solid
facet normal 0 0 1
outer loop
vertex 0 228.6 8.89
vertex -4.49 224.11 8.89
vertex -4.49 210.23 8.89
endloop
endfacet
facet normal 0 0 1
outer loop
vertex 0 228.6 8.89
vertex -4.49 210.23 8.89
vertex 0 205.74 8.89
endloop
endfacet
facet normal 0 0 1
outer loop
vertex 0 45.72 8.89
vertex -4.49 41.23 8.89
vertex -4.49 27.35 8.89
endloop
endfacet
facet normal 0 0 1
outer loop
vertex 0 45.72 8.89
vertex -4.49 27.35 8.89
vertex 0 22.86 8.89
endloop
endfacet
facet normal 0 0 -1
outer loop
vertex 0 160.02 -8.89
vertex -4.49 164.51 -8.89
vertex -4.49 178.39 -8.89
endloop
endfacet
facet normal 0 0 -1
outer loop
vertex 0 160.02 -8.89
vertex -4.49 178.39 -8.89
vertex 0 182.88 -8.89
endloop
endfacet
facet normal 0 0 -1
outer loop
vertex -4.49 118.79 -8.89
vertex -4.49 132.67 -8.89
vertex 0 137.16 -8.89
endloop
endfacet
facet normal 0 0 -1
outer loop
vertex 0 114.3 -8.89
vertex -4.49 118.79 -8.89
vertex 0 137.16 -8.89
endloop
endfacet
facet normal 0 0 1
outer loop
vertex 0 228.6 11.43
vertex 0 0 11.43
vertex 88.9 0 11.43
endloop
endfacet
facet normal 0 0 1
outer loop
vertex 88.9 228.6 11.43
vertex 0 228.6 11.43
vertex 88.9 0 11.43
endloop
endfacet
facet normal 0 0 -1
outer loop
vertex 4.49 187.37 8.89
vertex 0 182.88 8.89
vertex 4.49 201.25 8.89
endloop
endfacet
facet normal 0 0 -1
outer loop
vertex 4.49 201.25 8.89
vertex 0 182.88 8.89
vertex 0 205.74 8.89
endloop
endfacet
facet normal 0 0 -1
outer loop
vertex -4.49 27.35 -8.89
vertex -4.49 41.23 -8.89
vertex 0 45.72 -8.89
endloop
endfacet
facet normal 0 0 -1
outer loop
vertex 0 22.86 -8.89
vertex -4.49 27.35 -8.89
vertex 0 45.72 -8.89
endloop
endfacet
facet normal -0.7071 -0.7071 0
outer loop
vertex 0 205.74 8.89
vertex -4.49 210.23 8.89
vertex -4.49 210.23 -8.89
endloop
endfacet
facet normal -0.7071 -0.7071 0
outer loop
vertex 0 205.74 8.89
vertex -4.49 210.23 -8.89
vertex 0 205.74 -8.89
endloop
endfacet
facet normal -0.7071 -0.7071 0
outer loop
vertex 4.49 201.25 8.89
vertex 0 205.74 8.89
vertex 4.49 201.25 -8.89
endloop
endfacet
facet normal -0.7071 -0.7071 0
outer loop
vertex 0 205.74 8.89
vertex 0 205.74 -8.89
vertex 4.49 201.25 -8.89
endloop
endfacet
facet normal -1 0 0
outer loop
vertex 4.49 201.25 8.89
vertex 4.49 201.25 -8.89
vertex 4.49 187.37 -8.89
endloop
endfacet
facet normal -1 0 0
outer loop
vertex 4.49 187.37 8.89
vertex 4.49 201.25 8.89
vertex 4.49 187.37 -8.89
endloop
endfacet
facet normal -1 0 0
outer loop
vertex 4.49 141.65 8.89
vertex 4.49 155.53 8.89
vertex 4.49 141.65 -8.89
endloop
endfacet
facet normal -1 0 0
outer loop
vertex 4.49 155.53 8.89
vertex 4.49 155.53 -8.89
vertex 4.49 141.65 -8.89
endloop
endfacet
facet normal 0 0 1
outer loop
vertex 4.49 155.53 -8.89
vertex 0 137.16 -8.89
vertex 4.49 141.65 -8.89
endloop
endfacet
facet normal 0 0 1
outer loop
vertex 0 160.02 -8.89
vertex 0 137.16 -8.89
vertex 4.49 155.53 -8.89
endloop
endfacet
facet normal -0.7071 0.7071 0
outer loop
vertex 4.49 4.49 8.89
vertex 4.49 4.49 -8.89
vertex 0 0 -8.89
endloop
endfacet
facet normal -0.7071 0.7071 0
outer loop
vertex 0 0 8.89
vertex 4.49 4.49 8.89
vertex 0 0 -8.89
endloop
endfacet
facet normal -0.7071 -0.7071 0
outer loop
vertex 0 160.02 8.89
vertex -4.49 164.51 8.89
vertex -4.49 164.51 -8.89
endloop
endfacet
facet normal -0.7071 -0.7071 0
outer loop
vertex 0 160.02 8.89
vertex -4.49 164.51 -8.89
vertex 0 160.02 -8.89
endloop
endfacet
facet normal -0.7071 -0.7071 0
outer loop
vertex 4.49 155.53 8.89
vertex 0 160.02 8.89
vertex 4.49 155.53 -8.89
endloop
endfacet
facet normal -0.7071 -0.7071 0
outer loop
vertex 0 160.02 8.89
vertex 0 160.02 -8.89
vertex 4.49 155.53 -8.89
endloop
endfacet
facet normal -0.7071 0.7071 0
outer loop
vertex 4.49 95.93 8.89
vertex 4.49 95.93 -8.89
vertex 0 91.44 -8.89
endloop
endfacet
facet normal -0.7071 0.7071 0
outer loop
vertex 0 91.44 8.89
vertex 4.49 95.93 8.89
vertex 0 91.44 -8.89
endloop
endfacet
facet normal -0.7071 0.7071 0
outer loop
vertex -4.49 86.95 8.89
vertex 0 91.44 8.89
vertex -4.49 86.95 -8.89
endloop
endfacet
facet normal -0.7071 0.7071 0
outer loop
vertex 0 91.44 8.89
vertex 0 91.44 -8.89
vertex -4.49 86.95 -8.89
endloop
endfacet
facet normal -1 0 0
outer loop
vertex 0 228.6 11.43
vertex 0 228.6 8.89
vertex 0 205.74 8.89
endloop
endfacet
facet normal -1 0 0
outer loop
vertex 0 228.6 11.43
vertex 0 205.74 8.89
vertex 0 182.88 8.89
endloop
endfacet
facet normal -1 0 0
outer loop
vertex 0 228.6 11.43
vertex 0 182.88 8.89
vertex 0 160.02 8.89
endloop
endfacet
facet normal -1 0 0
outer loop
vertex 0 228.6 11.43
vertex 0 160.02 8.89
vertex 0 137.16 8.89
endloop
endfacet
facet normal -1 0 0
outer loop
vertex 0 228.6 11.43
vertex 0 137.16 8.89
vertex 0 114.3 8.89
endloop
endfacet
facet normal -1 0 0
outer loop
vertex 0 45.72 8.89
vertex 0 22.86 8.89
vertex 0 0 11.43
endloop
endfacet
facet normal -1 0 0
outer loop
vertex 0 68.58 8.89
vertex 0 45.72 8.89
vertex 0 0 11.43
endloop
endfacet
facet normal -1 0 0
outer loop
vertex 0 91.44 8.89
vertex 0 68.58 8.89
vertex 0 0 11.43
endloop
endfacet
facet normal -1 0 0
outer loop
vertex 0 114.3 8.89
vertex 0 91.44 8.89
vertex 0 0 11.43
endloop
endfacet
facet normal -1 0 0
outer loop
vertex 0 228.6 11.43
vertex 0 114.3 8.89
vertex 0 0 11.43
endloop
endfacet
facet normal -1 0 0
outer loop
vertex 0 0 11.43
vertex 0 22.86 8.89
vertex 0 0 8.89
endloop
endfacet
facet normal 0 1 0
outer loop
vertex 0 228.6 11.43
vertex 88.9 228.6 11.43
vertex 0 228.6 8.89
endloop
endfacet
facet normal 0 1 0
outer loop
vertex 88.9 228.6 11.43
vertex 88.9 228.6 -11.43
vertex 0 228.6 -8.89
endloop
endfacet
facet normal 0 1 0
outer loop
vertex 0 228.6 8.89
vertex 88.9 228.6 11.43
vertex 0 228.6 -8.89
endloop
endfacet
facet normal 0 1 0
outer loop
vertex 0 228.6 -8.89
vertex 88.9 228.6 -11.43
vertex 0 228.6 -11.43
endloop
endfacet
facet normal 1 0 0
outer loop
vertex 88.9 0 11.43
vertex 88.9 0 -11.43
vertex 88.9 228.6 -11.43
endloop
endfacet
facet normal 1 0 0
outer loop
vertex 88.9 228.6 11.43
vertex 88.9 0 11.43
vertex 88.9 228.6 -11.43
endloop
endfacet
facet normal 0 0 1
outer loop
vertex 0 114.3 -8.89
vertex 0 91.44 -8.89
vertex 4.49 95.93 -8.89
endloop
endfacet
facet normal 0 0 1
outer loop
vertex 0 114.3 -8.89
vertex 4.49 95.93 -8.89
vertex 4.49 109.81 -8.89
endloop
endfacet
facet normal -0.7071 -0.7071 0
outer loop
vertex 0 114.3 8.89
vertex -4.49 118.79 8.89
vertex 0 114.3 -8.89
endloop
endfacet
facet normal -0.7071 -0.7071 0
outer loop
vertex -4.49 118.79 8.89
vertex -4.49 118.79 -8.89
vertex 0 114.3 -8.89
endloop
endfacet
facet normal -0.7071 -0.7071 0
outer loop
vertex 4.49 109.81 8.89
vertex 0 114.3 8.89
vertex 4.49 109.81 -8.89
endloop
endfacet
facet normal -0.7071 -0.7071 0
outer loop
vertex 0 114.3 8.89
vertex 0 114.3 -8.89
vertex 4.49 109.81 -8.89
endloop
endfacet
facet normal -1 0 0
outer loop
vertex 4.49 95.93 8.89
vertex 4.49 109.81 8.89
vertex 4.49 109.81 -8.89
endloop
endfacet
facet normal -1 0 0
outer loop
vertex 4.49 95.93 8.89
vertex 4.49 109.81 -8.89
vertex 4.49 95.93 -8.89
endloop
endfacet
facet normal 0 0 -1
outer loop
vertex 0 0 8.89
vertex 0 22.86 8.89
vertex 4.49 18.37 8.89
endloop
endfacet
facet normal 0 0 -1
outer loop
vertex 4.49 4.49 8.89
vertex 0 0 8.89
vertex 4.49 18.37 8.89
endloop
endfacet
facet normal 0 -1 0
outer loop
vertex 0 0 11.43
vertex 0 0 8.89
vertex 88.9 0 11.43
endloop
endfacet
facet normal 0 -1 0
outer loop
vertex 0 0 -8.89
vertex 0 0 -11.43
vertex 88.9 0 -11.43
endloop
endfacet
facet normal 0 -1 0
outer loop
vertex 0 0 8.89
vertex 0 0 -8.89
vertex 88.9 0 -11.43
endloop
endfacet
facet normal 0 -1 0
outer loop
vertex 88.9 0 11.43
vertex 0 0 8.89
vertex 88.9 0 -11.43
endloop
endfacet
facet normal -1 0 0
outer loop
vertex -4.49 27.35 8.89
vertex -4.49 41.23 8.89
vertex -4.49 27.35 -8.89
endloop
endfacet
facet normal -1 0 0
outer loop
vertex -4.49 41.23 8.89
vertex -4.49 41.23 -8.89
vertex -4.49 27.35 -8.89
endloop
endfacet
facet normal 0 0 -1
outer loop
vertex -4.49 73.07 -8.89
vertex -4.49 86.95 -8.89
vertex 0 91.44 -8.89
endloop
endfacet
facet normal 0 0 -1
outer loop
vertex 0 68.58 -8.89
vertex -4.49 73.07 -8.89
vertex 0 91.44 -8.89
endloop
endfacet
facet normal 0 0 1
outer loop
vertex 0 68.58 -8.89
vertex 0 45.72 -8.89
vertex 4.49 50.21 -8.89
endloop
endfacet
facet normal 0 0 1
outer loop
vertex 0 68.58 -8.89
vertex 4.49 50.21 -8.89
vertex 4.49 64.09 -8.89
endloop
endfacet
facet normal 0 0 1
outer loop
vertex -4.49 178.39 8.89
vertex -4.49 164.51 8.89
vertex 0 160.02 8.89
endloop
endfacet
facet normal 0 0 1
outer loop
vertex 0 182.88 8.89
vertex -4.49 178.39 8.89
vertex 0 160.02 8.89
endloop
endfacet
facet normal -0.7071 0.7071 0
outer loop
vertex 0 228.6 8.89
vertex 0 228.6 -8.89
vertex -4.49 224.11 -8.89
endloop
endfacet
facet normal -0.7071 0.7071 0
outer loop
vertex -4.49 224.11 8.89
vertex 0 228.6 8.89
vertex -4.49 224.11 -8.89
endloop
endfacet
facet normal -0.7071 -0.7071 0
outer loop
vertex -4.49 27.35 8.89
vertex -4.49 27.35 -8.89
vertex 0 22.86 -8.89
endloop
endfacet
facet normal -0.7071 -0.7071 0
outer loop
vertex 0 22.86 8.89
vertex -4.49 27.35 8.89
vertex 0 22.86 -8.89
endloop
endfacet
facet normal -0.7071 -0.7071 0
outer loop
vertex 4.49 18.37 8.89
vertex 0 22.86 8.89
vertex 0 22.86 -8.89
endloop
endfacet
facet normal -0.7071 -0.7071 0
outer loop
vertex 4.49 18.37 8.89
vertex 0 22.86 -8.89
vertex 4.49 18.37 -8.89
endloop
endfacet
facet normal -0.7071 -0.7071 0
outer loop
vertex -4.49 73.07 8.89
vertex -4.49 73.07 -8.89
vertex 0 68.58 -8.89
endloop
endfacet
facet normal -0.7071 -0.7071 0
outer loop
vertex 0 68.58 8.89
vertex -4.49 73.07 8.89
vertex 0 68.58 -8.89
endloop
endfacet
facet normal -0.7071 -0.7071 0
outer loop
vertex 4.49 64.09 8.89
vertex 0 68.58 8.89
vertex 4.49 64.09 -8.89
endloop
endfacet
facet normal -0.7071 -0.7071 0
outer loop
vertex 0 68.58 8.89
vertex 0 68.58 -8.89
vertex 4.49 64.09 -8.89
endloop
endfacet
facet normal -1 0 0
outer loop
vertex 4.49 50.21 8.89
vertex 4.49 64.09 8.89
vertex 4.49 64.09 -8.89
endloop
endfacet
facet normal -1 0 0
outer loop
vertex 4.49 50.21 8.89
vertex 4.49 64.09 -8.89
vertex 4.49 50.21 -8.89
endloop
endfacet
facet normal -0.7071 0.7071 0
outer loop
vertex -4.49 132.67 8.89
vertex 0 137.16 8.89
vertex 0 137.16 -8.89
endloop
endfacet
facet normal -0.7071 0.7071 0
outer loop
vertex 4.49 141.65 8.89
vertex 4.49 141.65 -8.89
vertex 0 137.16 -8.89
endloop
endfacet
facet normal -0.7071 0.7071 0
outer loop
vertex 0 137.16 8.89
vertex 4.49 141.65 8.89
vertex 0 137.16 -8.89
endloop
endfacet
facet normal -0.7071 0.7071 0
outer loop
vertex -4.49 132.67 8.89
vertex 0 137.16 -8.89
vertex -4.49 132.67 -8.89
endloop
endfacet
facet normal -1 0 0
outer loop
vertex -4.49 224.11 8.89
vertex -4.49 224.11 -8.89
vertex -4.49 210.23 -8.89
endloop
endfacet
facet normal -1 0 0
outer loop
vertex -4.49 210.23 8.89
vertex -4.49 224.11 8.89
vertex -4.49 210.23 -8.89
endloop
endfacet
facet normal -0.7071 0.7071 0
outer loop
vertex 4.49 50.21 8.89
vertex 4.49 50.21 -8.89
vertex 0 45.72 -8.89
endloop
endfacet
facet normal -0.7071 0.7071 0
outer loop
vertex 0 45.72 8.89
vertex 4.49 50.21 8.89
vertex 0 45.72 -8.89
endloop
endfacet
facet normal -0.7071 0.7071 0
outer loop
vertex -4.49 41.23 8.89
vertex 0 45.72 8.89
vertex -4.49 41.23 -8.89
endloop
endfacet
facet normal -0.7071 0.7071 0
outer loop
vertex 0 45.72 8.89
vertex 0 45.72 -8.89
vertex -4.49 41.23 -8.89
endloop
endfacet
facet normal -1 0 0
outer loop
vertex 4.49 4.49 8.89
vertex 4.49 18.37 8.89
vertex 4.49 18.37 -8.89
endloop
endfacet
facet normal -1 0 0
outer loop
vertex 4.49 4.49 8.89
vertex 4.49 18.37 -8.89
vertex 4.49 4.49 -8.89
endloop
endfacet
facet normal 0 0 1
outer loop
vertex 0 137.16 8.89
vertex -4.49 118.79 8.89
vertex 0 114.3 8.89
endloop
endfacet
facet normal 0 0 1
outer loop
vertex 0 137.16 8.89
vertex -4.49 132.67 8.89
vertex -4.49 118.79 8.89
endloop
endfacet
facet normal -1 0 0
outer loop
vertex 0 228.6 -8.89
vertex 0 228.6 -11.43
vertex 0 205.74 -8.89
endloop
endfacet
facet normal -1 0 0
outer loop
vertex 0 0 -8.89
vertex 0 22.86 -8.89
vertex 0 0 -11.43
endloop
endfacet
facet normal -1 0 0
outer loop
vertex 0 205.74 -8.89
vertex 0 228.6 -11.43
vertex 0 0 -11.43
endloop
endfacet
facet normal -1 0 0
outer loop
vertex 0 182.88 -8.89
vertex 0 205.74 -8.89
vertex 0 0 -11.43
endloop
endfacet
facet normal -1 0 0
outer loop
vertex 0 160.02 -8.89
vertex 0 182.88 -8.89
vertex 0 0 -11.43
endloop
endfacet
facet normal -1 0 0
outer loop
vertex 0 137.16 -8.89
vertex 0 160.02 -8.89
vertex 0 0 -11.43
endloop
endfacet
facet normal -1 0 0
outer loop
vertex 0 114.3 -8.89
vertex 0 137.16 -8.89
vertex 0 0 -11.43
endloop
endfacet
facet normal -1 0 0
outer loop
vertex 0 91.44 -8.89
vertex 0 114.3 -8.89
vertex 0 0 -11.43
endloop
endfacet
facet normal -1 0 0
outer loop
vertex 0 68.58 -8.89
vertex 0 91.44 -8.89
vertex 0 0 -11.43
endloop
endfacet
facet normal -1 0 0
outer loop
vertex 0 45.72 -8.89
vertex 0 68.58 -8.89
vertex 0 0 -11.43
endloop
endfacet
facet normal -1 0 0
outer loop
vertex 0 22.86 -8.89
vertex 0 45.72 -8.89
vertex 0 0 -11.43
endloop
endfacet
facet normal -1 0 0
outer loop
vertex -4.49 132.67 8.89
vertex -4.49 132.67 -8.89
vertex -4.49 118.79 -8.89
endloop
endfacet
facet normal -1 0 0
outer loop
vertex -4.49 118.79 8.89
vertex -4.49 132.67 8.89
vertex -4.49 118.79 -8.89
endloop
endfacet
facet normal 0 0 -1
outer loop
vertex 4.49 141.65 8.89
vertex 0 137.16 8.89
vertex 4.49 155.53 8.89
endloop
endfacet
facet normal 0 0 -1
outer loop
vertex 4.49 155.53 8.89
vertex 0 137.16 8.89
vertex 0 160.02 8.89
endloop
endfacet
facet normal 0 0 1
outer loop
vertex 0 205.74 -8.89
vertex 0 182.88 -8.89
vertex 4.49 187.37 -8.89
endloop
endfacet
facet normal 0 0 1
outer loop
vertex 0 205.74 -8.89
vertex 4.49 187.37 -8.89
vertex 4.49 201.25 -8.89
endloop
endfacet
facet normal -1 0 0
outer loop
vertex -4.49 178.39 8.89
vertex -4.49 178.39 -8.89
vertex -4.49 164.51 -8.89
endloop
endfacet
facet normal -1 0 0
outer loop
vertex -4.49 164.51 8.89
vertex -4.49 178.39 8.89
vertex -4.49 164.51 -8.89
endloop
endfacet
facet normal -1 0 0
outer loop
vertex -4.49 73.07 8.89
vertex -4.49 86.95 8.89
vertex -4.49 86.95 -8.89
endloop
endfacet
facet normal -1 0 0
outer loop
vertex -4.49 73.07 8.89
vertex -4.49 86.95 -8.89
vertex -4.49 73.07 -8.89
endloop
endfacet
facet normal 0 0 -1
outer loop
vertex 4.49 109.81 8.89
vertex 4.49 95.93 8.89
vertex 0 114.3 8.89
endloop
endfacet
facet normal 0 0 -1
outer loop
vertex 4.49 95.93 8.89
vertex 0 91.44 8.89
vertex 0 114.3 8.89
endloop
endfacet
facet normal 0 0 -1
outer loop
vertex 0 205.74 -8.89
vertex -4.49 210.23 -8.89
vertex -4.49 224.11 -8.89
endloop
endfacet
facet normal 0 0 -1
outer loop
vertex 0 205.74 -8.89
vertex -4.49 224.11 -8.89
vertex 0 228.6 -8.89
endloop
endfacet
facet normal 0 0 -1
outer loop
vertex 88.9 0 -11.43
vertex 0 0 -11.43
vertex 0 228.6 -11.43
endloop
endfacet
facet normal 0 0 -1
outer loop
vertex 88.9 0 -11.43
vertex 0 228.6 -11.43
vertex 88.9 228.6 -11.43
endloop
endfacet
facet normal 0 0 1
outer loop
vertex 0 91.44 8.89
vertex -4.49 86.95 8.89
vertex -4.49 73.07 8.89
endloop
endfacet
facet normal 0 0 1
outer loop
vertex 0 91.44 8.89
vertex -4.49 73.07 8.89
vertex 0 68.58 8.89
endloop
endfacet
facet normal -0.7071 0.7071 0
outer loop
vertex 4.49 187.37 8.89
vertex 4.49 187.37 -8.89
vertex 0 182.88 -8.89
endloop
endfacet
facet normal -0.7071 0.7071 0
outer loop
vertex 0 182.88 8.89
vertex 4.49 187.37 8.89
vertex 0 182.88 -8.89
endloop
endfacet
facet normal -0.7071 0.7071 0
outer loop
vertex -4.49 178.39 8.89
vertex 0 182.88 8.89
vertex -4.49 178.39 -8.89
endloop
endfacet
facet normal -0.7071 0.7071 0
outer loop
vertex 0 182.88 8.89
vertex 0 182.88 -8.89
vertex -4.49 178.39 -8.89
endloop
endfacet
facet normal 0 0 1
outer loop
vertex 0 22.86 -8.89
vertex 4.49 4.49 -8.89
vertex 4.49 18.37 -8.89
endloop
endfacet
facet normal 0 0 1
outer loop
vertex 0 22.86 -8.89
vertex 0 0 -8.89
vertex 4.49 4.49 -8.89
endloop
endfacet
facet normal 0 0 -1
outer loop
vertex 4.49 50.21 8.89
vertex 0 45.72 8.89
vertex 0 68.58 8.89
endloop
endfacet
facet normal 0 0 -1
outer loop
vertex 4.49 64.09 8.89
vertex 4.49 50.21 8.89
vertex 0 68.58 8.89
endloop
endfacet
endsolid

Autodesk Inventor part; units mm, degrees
ref_plane "YZ Plane" through (0, 0, 0) normal (1, 0, 0) x (0, 1, 0)
ref_plane "XZ Plane" through (0, 0, 0) normal (0, 1, 0) x (-1, 0, 0)
ref_plane "XY Plane" through (0, 0, 0) normal (0, 0, 1) x (1, 0, 0)
sketch "Sketch1" plane through (0, 0, 0) normal (0, 0, 1) x (1, 0, 0)
  line L0 (0, 0) -> (88.9, 0)
  line L1 (88.9, 0) -> (88.9, 228.6)
  line L2 (88.9, 228.6) -> (0, 228.6)
  line L3 (0, 228.6) -> (0, 0)
  dimension "d0" = 88.9
  dimension "d1" = 228.6
extrude "door" add sketch "Sketch1" along normal mid plane 22.86
sketch "Sketch2" plane through (0, 0, 0) normal (0, 0, 1) x (1, 0, 0)
  line L0 (88.9, 228.6) -> (0, 228.6) projected
  line L1 (88.9, 0) -> (0, 0) projected
  line L2 (4.4901, 64.0899) -> (4.4901, 50.2101)
  line L3 (4.4901, 50.2101) -> (0, 45.72)
  line L4 (0, 45.72) -> (-4.4901, 41.2299)
  line L5 (-4.4901, 41.2299) -> (-4.4901, 27.3501)
  line L6 (-4.4901, 27.3501) -> (0, 22.86)
  line L7 (0, 22.86) -> (0, 45.72)
  line L8 (0, 22.86) -> (4.4901, 18.3699)
  line L9 (4.4901, 18.3699) -> (4.4901, 4.4901)
  line L10 (4.4901, 4.4901) -> (0, 0)
  line L11 (0, 0) -> (0, 22.86)
  line L12 (0, 45.72) -> (0, 68.58)
  line L13 (-4.4901, 178.3899) -> (-4.4901, 164.5101)
  line L14 (0, 160.02) -> (0, 182.88)
  line L15 (-4.4901, 164.5101) -> (0, 160.02)
  line L16 (0, 160.02) -> (4.4901, 155.5299)
  line L17 (4.4901, 155.5299) -> (4.4901, 141.6501)
  line L18 (4.4901, 141.6501) -> (0, 137.16)
  line L19 (0, 137.16) -> (0, 160.02)
  line L20 (0, 137.16) -> (-4.4901, 132.6699)
  line L21 (-4.4901, 132.6699) -> (-4.4901, 118.7901)
  line L22 (0, 114.3) -> (0, 137.16)
  line L23 (-4.4901, 118.7901) -> (0, 114.3)
  line L24 (0, 114.3) -> (4.4901, 109.8099)
  line L25 (-4.4901, 73.0701) -> (0, 68.58)
  line L26 (-4.4901, 86.9499) -> (-4.4901, 73.0701)
  line L27 (0, 68.58) -> (0, 91.44)
  line L28 (0, 91.44) -> (-4.4901, 86.9499)
  line L29 (4.4901, 95.9301) -> (0, 91.44)
  line L30 (4.4901, 109.8099) -> (4.4901, 95.9301)
  line L31 (0, 91.44) -> (0, 114.3)
  line L32 (0, 68.58) -> (4.4901, 64.0899)
  line L33 (0, 228.6) -> (-4.4901, 224.1099)
  line L34 (0, 182.88) -> (-4.4901, 178.3899)
  line L35 (4.4901, 187.3701) -> (0, 182.88)
  line L36 (4.4901, 201.2499) -> (4.4901, 187.3701)
  line L37 (0, 182.88) -> (0, 205.74)
  line L38 (0, 205.74) -> (4.4901, 201.2499)
  line L39 (-4.4901, 210.2301) -> (0, 205.74)
  line L40 (-4.4901, 224.1099) -> (-4.4901, 210.2301)
  line L41 (0, 205.74) -> (0, 228.6)
  point P0 (-4.4901, 34.29)
  point P1 (4.4901, 57.15)
  point P2 (-4.4901, 80.01)
  point P3 (4.4901, 102.87)
  point P4 (-4.4901, 125.73)
  point P5 (4.4901, 148.59)
  point P6 (-4.4901, 171.45)
  point P7 (4.4901, 194.31)
  point P8 (-4.4901, 217.17)
  dimension "d36" = 6.35
  dimension "d37" = 228.6
  dimension "d38" = 11.43
  dimension "d39" = 11.43
  dimension "d40" = 11.43
  dimension "d41" = 11.43
  dimension "d42" = 11.43
  dimension "d43" = 11.43
  dimension "d44" = 11.43
  dimension "d45" = 11.43
  dimension "d46" = 45
  dimension "d47" = 45
extrude "teeth cut" cut sketch "Sketch2" along normal mid plane 17.78 contours L8 L9 L10 L11 | L37 L38 L36 L35 | L19 L16 L17 L18 | L31 L24 L30 L29 | L2 L3 L12 L32
extrude "teeth make" add sketch "Sketch2" along normal mid plane 17.78 contours L7 L6 L5 L4 | L39 L40 L33 L41 | L15 L13 L34 L14 | L23 L21 L20 L22 | L25 L26 L28 L27
equation "\"d38\" = d48"
equation "\"d39\" = d48"
equation "\"d40\" = d48"
equation "\"d41\" = d48"
equation "\"d42\" = d48"
equation "\"d43\" = d48"
equation "\"d44\" = d48"
equation "\"d45\" = d48"
equation "\"d21\" = d19"
equation "\"d48\" = 0.05 * d37"
equation "\"d19\" = 17.78"
properties part number "door (right side) 2nd map"
